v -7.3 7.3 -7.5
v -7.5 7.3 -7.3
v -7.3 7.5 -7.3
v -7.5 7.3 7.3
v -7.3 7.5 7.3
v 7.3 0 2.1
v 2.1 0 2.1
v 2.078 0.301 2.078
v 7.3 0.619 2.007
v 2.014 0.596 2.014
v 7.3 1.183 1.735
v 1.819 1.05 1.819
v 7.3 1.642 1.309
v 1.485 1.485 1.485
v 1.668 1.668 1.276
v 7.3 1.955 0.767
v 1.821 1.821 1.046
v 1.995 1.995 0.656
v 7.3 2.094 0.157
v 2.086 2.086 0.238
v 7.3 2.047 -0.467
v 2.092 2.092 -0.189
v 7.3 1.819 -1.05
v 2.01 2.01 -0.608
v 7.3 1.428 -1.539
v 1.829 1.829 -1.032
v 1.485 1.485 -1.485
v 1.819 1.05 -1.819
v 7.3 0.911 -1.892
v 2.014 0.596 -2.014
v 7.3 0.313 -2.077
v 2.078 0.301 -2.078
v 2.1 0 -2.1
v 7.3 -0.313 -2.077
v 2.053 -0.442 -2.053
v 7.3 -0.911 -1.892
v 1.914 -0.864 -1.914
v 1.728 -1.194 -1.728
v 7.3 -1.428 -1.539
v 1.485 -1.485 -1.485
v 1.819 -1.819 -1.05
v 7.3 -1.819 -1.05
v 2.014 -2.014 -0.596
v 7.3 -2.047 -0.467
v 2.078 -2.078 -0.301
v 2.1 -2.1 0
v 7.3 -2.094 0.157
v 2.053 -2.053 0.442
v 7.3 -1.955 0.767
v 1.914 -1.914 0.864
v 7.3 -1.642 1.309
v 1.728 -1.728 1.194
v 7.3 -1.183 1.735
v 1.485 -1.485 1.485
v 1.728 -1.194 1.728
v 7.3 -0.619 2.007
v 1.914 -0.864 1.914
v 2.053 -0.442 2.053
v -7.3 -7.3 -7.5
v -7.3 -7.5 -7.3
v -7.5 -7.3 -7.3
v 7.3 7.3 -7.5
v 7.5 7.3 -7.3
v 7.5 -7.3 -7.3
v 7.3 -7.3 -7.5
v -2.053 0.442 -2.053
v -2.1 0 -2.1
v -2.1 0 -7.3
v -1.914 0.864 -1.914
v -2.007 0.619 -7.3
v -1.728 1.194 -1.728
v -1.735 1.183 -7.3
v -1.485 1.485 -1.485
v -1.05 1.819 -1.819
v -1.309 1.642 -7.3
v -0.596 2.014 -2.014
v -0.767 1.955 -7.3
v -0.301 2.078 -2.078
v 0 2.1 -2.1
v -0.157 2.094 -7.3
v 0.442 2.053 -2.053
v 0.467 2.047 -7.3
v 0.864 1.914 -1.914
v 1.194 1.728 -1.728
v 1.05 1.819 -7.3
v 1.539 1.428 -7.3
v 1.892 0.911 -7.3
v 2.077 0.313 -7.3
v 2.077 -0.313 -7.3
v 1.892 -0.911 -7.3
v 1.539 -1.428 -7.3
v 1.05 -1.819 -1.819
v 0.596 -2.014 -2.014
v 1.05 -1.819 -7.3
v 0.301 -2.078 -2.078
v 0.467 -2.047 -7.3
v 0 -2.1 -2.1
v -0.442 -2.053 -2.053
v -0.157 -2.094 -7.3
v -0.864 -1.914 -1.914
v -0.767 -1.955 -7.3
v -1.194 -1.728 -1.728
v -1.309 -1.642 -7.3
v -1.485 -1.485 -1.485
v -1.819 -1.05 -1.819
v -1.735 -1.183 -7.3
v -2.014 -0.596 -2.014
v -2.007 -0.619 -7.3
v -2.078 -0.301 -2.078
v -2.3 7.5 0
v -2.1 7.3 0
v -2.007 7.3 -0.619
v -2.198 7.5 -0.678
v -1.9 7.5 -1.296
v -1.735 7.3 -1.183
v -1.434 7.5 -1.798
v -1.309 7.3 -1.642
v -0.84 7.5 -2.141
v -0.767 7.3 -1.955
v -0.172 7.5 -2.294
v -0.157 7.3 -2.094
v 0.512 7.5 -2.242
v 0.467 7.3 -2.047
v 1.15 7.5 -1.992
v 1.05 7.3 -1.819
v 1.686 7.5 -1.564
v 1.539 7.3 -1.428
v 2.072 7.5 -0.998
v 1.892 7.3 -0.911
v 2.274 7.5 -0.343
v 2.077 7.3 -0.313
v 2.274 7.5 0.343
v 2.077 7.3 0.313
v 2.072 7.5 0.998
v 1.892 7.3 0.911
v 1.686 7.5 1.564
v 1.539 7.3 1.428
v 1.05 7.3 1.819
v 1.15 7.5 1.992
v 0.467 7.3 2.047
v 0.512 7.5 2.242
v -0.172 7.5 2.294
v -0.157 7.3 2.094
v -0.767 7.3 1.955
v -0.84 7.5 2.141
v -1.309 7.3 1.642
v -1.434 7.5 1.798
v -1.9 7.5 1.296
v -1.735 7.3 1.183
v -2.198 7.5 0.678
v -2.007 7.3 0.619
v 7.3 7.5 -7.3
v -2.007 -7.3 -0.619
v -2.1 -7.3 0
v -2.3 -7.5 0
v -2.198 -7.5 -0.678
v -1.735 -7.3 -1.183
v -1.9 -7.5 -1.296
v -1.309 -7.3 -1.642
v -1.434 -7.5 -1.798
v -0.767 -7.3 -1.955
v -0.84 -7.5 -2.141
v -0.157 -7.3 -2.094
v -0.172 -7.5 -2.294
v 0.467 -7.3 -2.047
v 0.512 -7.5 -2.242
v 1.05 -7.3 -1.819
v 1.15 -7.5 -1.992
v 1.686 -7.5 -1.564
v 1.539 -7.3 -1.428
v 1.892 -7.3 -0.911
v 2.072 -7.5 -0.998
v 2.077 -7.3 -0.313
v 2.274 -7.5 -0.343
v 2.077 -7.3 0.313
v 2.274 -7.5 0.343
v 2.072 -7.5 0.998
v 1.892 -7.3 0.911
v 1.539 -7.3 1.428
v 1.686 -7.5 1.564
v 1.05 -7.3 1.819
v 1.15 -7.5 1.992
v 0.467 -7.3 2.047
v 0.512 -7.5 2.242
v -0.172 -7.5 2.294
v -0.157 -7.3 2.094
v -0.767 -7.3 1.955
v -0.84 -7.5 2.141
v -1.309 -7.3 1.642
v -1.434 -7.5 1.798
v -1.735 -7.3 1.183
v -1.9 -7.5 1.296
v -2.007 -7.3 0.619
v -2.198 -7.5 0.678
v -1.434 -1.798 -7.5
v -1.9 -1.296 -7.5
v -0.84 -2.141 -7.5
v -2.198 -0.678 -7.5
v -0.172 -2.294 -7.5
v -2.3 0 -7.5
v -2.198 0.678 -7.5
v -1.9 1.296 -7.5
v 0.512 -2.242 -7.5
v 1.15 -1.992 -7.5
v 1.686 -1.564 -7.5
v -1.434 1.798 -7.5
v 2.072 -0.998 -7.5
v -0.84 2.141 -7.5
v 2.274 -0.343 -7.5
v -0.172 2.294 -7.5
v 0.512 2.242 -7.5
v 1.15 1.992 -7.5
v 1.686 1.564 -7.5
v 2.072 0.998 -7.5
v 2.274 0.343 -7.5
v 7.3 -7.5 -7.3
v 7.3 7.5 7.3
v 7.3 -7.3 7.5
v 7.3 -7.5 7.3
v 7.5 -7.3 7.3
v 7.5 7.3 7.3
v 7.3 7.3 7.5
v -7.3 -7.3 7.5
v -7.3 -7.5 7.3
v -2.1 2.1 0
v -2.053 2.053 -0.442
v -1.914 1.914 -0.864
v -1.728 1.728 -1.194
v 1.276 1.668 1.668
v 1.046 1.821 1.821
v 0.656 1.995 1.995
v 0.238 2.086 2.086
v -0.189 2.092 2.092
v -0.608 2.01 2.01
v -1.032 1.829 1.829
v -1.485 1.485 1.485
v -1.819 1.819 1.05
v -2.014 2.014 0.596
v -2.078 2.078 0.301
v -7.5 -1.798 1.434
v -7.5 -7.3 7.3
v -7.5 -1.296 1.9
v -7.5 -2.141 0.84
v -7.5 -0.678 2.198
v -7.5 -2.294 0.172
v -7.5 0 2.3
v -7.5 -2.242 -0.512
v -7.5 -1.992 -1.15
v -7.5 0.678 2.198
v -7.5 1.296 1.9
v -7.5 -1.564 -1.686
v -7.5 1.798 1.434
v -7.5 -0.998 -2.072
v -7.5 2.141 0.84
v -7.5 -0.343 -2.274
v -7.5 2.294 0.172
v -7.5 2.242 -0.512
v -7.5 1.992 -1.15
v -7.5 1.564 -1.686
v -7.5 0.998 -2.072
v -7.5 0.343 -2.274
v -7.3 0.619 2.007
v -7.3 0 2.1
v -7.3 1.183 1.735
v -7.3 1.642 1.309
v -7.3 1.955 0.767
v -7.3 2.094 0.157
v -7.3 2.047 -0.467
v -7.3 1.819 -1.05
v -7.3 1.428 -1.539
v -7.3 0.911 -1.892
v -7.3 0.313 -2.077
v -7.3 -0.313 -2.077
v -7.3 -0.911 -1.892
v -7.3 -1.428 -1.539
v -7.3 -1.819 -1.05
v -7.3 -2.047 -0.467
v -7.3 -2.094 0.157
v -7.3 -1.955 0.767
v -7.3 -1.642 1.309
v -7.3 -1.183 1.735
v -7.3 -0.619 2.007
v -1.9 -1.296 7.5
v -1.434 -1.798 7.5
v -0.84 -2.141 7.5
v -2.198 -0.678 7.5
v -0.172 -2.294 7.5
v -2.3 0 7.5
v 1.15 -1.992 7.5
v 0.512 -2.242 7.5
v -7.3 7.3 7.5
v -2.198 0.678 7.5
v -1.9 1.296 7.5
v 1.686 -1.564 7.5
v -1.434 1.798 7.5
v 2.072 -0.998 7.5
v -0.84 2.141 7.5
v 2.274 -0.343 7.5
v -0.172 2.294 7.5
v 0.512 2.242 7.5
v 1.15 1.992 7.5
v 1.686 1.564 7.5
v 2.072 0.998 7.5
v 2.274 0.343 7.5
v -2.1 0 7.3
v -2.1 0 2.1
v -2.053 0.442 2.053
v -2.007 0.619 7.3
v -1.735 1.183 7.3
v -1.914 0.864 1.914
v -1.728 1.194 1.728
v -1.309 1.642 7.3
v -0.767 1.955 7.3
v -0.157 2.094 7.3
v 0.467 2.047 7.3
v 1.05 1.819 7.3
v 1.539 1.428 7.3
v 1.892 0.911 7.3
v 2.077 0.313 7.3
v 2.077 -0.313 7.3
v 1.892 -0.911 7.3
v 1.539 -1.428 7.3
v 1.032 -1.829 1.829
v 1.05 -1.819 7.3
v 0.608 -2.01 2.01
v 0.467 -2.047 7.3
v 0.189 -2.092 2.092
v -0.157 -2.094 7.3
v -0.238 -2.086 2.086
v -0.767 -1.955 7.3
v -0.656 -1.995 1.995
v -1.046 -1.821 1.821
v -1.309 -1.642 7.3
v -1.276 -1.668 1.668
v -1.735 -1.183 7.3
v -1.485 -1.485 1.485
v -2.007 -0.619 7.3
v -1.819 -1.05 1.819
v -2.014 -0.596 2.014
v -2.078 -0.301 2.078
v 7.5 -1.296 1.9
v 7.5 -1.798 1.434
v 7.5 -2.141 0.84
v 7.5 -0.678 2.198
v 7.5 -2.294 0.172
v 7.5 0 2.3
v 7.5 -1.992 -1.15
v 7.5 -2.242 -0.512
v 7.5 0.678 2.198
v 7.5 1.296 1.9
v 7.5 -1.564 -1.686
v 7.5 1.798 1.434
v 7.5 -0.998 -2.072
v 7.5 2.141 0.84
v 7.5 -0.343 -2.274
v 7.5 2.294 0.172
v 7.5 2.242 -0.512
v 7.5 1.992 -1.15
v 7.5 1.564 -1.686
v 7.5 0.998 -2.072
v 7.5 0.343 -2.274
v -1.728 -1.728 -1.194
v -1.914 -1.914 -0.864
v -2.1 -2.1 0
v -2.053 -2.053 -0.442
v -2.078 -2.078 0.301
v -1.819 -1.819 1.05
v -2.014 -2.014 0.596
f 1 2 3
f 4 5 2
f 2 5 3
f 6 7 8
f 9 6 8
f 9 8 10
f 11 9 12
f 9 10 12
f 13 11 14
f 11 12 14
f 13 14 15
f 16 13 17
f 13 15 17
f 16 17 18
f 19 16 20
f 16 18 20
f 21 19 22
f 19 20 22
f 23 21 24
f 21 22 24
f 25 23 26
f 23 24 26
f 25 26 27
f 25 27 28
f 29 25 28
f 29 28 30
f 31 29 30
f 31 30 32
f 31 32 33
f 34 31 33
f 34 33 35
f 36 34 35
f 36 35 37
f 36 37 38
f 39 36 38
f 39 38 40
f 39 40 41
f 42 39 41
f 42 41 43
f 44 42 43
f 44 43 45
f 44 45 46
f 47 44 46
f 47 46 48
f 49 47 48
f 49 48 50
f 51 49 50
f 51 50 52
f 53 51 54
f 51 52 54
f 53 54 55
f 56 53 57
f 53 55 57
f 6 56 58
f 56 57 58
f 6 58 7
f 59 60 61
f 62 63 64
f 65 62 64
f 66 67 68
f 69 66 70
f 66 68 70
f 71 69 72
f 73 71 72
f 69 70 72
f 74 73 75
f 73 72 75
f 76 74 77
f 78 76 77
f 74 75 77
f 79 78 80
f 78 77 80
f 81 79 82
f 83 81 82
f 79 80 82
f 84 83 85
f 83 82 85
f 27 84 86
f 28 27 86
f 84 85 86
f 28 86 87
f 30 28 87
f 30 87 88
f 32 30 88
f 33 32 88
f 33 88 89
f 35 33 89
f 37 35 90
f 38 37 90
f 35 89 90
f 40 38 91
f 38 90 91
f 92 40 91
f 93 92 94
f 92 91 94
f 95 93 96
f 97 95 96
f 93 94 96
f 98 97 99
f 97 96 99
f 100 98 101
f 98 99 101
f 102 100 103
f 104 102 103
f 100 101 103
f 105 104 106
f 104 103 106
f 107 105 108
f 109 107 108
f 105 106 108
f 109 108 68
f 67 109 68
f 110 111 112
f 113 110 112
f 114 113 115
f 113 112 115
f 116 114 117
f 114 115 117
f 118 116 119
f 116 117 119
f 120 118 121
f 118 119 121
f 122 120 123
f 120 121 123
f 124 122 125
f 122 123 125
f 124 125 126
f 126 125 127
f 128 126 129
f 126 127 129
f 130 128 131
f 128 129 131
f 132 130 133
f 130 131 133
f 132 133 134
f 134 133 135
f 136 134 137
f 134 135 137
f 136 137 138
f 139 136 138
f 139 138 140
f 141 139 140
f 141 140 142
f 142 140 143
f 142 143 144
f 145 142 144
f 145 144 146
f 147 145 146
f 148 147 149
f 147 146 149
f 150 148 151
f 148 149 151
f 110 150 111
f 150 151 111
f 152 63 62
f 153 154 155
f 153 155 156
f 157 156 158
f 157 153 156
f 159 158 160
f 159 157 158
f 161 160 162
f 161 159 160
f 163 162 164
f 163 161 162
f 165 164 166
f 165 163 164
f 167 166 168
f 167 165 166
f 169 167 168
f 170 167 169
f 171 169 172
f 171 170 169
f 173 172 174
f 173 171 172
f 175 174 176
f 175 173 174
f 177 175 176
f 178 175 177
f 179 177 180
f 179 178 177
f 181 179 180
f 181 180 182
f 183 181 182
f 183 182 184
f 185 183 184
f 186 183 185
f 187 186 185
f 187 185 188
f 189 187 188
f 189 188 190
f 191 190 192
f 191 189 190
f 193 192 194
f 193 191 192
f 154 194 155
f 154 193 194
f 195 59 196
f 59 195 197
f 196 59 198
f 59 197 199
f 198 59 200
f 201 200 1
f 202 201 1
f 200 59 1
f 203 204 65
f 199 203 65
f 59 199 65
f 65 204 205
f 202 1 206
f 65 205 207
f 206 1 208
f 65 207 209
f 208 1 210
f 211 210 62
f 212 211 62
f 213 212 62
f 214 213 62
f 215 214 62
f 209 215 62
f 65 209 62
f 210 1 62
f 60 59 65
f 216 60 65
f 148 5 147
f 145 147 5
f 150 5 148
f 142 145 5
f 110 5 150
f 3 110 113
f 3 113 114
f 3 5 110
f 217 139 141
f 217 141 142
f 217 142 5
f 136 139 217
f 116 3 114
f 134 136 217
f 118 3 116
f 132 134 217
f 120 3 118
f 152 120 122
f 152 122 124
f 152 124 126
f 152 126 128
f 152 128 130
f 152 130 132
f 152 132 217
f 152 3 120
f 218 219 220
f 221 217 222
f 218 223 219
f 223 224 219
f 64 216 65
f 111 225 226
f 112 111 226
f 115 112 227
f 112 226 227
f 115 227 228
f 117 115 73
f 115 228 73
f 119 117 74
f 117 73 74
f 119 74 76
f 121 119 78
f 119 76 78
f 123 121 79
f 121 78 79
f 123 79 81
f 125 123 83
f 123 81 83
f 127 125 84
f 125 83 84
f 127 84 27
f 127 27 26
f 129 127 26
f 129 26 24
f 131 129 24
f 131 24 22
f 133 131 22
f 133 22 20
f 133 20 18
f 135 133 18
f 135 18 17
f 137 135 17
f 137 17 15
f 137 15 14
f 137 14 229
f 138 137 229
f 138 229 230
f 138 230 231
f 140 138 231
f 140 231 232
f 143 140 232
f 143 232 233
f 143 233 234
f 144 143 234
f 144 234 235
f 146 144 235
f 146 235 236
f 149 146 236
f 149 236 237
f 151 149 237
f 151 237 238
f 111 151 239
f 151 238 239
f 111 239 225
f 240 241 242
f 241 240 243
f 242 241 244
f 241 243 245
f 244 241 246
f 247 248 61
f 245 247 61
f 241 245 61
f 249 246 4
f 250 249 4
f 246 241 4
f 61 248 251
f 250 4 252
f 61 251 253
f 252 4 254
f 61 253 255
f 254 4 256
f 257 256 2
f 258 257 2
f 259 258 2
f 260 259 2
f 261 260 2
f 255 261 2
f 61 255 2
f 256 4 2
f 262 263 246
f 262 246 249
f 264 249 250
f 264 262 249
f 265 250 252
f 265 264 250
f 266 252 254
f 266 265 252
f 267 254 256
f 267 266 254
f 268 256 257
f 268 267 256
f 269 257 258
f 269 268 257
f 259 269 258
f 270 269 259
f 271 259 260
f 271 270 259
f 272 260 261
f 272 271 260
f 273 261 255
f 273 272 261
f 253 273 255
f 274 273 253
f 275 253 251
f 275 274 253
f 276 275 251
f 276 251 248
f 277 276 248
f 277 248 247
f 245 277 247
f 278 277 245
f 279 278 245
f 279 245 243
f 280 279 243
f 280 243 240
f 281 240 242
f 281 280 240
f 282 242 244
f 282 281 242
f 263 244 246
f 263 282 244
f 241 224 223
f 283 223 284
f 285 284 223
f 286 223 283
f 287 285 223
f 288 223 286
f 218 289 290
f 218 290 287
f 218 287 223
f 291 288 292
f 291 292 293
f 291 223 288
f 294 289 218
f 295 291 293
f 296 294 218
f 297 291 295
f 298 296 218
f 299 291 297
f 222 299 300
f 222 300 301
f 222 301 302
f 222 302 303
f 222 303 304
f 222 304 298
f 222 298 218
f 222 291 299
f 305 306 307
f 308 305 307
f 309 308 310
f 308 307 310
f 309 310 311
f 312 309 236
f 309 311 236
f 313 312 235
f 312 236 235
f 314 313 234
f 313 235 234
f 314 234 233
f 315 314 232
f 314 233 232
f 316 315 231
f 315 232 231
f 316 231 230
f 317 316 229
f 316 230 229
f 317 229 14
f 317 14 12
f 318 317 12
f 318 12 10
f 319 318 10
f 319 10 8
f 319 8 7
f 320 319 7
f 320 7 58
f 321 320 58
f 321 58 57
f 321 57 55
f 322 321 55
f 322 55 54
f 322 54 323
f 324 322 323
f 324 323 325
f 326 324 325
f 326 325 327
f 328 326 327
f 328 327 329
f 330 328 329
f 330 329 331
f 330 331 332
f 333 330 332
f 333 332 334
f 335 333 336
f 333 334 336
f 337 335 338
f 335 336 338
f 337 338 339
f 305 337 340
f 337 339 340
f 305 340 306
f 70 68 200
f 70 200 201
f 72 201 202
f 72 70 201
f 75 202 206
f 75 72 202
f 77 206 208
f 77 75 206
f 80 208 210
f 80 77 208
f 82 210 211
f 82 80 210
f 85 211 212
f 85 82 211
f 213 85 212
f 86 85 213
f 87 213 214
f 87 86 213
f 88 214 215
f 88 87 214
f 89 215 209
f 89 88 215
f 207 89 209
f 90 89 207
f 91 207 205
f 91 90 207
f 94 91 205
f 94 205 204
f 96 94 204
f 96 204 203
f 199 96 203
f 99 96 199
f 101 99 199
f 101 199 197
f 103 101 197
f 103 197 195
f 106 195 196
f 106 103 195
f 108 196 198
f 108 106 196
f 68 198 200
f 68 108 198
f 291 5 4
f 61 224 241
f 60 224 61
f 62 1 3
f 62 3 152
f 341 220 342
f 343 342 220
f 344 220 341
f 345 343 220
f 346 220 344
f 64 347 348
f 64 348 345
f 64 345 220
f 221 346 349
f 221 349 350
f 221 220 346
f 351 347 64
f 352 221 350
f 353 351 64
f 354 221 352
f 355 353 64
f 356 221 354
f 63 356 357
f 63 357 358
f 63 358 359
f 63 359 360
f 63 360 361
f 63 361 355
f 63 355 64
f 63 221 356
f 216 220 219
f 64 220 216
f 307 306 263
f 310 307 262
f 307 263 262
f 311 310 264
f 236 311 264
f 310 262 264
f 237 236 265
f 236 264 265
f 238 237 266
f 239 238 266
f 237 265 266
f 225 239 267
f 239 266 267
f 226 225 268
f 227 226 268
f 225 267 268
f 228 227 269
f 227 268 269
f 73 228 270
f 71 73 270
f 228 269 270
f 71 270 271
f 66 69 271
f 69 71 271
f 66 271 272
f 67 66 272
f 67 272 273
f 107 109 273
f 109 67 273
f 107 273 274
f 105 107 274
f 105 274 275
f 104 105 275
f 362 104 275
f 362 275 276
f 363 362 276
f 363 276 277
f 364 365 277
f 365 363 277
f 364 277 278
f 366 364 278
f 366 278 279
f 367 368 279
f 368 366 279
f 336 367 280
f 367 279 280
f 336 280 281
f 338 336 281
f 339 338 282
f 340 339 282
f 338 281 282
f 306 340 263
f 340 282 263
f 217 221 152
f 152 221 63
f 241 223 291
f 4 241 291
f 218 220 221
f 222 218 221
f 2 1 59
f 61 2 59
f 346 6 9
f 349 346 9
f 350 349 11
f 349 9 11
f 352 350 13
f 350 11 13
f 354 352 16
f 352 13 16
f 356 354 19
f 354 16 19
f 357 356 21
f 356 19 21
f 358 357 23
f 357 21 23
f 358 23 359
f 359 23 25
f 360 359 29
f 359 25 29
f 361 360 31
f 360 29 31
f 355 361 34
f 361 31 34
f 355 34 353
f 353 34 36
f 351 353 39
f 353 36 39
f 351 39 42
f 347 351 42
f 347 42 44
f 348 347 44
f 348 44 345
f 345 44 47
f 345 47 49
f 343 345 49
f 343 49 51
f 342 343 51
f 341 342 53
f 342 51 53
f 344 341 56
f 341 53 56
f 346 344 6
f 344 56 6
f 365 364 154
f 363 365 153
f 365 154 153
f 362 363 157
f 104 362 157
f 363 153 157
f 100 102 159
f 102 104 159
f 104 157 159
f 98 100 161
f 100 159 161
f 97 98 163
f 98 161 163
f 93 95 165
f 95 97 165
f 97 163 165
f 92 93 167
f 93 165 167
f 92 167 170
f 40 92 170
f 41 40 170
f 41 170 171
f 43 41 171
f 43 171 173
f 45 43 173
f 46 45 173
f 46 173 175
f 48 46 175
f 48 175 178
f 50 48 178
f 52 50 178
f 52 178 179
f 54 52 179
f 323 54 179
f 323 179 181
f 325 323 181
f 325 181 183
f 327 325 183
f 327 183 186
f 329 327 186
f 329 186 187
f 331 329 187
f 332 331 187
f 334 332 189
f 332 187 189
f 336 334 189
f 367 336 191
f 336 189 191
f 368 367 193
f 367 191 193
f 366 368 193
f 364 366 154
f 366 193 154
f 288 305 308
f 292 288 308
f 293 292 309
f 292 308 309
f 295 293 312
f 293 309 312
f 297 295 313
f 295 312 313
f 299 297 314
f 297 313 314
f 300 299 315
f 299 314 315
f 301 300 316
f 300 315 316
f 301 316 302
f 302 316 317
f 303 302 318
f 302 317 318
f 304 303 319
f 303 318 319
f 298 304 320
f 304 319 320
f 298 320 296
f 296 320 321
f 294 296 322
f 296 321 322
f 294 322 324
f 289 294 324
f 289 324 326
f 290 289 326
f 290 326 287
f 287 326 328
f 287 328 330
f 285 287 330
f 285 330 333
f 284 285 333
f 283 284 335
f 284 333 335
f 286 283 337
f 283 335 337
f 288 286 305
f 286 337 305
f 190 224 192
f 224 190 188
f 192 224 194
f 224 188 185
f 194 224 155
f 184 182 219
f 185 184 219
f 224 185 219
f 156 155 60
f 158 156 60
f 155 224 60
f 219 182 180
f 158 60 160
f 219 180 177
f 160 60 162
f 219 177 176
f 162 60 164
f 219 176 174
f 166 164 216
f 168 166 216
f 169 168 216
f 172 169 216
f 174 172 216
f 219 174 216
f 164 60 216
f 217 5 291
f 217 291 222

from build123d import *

# Parameters (mm, degrees)
SKETCH_1_W         = 15
SKETCH_1_H         = 15
EXTRUDE_1_DEPTH    = 7.5
HOLE_WIZARD_M5_1_D = 4.2
HOLE_WIZARD_M5_2_D = 4.2
HOLE_WIZARD_M5_3_D = 4.2
CHAMFER_1_SIZE     = 0.2


with BuildPart() as part:
    # 草图1 → 凸台-拉伸1 (new, symmetric)
    with BuildSketch(Plane(origin=(0, 0, 0), x_dir=(1, 0, 0), z_dir=(0, 1, 0))):
        Rectangle(SKETCH_1_W, SKETCH_1_H)
    extrude(amount=EXTRUDE_1_DEPTH, both=True)

    # M5 螺纹孔1 (through all)
    with Locations(Plane.XY.offset(7.5)):
        with Locations((0, 0)):
            Hole(HOLE_WIZARD_M5_1_D / 2)

    # M5 螺纹孔2 (through all)
    with Locations(Plane(origin=(0, 7.5, 0), x_dir=(1, 0, 0), z_dir=(0, 1, 0))):
        with Locations((0, 0)):
            Hole(HOLE_WIZARD_M5_2_D / 2)

    # M5 螺纹孔3 (through all)
    with Locations(Plane(origin=(7.5, 0, 0), x_dir=(0, 0, -1), z_dir=(1, 0, 0))):
        with Locations((0, 0)):
            Hole(HOLE_WIZARD_M5_3_D / 2)

    # 倒角1
    chamfer_1_edges = [part.edges().sort_by_distance(p)[0] for p in [
        (-7.5, 7.5, 0),
        (2.1, 0, 7.5),
        (2.1, 0, -7.5),
        (0, 7.5, 7.5),
        (2.1, -7.5, 0),
        (2.1, 7.5, 0),
        (-7.5, 0, -2.1),
        (7.5, 0, -2.1),
        (7.5, 7.5, 0),
        (0, -7.5, 7.5),
        (-7.5, -7.5, 0),
        (0, -7.5, -7.5),
        (7.5, -7.5, 0),
        (7.5, 0, 7.5),
        (-7.5, 0, 7.5),
        (-7.5, 0, -7.5),
        (7.5, 0, -7.5),
        (0, 7.5, -7.5),
    ]]
    chamfer(chamfer_1_edges, length=CHAMFER_1_SIZE)


solid = part.part
